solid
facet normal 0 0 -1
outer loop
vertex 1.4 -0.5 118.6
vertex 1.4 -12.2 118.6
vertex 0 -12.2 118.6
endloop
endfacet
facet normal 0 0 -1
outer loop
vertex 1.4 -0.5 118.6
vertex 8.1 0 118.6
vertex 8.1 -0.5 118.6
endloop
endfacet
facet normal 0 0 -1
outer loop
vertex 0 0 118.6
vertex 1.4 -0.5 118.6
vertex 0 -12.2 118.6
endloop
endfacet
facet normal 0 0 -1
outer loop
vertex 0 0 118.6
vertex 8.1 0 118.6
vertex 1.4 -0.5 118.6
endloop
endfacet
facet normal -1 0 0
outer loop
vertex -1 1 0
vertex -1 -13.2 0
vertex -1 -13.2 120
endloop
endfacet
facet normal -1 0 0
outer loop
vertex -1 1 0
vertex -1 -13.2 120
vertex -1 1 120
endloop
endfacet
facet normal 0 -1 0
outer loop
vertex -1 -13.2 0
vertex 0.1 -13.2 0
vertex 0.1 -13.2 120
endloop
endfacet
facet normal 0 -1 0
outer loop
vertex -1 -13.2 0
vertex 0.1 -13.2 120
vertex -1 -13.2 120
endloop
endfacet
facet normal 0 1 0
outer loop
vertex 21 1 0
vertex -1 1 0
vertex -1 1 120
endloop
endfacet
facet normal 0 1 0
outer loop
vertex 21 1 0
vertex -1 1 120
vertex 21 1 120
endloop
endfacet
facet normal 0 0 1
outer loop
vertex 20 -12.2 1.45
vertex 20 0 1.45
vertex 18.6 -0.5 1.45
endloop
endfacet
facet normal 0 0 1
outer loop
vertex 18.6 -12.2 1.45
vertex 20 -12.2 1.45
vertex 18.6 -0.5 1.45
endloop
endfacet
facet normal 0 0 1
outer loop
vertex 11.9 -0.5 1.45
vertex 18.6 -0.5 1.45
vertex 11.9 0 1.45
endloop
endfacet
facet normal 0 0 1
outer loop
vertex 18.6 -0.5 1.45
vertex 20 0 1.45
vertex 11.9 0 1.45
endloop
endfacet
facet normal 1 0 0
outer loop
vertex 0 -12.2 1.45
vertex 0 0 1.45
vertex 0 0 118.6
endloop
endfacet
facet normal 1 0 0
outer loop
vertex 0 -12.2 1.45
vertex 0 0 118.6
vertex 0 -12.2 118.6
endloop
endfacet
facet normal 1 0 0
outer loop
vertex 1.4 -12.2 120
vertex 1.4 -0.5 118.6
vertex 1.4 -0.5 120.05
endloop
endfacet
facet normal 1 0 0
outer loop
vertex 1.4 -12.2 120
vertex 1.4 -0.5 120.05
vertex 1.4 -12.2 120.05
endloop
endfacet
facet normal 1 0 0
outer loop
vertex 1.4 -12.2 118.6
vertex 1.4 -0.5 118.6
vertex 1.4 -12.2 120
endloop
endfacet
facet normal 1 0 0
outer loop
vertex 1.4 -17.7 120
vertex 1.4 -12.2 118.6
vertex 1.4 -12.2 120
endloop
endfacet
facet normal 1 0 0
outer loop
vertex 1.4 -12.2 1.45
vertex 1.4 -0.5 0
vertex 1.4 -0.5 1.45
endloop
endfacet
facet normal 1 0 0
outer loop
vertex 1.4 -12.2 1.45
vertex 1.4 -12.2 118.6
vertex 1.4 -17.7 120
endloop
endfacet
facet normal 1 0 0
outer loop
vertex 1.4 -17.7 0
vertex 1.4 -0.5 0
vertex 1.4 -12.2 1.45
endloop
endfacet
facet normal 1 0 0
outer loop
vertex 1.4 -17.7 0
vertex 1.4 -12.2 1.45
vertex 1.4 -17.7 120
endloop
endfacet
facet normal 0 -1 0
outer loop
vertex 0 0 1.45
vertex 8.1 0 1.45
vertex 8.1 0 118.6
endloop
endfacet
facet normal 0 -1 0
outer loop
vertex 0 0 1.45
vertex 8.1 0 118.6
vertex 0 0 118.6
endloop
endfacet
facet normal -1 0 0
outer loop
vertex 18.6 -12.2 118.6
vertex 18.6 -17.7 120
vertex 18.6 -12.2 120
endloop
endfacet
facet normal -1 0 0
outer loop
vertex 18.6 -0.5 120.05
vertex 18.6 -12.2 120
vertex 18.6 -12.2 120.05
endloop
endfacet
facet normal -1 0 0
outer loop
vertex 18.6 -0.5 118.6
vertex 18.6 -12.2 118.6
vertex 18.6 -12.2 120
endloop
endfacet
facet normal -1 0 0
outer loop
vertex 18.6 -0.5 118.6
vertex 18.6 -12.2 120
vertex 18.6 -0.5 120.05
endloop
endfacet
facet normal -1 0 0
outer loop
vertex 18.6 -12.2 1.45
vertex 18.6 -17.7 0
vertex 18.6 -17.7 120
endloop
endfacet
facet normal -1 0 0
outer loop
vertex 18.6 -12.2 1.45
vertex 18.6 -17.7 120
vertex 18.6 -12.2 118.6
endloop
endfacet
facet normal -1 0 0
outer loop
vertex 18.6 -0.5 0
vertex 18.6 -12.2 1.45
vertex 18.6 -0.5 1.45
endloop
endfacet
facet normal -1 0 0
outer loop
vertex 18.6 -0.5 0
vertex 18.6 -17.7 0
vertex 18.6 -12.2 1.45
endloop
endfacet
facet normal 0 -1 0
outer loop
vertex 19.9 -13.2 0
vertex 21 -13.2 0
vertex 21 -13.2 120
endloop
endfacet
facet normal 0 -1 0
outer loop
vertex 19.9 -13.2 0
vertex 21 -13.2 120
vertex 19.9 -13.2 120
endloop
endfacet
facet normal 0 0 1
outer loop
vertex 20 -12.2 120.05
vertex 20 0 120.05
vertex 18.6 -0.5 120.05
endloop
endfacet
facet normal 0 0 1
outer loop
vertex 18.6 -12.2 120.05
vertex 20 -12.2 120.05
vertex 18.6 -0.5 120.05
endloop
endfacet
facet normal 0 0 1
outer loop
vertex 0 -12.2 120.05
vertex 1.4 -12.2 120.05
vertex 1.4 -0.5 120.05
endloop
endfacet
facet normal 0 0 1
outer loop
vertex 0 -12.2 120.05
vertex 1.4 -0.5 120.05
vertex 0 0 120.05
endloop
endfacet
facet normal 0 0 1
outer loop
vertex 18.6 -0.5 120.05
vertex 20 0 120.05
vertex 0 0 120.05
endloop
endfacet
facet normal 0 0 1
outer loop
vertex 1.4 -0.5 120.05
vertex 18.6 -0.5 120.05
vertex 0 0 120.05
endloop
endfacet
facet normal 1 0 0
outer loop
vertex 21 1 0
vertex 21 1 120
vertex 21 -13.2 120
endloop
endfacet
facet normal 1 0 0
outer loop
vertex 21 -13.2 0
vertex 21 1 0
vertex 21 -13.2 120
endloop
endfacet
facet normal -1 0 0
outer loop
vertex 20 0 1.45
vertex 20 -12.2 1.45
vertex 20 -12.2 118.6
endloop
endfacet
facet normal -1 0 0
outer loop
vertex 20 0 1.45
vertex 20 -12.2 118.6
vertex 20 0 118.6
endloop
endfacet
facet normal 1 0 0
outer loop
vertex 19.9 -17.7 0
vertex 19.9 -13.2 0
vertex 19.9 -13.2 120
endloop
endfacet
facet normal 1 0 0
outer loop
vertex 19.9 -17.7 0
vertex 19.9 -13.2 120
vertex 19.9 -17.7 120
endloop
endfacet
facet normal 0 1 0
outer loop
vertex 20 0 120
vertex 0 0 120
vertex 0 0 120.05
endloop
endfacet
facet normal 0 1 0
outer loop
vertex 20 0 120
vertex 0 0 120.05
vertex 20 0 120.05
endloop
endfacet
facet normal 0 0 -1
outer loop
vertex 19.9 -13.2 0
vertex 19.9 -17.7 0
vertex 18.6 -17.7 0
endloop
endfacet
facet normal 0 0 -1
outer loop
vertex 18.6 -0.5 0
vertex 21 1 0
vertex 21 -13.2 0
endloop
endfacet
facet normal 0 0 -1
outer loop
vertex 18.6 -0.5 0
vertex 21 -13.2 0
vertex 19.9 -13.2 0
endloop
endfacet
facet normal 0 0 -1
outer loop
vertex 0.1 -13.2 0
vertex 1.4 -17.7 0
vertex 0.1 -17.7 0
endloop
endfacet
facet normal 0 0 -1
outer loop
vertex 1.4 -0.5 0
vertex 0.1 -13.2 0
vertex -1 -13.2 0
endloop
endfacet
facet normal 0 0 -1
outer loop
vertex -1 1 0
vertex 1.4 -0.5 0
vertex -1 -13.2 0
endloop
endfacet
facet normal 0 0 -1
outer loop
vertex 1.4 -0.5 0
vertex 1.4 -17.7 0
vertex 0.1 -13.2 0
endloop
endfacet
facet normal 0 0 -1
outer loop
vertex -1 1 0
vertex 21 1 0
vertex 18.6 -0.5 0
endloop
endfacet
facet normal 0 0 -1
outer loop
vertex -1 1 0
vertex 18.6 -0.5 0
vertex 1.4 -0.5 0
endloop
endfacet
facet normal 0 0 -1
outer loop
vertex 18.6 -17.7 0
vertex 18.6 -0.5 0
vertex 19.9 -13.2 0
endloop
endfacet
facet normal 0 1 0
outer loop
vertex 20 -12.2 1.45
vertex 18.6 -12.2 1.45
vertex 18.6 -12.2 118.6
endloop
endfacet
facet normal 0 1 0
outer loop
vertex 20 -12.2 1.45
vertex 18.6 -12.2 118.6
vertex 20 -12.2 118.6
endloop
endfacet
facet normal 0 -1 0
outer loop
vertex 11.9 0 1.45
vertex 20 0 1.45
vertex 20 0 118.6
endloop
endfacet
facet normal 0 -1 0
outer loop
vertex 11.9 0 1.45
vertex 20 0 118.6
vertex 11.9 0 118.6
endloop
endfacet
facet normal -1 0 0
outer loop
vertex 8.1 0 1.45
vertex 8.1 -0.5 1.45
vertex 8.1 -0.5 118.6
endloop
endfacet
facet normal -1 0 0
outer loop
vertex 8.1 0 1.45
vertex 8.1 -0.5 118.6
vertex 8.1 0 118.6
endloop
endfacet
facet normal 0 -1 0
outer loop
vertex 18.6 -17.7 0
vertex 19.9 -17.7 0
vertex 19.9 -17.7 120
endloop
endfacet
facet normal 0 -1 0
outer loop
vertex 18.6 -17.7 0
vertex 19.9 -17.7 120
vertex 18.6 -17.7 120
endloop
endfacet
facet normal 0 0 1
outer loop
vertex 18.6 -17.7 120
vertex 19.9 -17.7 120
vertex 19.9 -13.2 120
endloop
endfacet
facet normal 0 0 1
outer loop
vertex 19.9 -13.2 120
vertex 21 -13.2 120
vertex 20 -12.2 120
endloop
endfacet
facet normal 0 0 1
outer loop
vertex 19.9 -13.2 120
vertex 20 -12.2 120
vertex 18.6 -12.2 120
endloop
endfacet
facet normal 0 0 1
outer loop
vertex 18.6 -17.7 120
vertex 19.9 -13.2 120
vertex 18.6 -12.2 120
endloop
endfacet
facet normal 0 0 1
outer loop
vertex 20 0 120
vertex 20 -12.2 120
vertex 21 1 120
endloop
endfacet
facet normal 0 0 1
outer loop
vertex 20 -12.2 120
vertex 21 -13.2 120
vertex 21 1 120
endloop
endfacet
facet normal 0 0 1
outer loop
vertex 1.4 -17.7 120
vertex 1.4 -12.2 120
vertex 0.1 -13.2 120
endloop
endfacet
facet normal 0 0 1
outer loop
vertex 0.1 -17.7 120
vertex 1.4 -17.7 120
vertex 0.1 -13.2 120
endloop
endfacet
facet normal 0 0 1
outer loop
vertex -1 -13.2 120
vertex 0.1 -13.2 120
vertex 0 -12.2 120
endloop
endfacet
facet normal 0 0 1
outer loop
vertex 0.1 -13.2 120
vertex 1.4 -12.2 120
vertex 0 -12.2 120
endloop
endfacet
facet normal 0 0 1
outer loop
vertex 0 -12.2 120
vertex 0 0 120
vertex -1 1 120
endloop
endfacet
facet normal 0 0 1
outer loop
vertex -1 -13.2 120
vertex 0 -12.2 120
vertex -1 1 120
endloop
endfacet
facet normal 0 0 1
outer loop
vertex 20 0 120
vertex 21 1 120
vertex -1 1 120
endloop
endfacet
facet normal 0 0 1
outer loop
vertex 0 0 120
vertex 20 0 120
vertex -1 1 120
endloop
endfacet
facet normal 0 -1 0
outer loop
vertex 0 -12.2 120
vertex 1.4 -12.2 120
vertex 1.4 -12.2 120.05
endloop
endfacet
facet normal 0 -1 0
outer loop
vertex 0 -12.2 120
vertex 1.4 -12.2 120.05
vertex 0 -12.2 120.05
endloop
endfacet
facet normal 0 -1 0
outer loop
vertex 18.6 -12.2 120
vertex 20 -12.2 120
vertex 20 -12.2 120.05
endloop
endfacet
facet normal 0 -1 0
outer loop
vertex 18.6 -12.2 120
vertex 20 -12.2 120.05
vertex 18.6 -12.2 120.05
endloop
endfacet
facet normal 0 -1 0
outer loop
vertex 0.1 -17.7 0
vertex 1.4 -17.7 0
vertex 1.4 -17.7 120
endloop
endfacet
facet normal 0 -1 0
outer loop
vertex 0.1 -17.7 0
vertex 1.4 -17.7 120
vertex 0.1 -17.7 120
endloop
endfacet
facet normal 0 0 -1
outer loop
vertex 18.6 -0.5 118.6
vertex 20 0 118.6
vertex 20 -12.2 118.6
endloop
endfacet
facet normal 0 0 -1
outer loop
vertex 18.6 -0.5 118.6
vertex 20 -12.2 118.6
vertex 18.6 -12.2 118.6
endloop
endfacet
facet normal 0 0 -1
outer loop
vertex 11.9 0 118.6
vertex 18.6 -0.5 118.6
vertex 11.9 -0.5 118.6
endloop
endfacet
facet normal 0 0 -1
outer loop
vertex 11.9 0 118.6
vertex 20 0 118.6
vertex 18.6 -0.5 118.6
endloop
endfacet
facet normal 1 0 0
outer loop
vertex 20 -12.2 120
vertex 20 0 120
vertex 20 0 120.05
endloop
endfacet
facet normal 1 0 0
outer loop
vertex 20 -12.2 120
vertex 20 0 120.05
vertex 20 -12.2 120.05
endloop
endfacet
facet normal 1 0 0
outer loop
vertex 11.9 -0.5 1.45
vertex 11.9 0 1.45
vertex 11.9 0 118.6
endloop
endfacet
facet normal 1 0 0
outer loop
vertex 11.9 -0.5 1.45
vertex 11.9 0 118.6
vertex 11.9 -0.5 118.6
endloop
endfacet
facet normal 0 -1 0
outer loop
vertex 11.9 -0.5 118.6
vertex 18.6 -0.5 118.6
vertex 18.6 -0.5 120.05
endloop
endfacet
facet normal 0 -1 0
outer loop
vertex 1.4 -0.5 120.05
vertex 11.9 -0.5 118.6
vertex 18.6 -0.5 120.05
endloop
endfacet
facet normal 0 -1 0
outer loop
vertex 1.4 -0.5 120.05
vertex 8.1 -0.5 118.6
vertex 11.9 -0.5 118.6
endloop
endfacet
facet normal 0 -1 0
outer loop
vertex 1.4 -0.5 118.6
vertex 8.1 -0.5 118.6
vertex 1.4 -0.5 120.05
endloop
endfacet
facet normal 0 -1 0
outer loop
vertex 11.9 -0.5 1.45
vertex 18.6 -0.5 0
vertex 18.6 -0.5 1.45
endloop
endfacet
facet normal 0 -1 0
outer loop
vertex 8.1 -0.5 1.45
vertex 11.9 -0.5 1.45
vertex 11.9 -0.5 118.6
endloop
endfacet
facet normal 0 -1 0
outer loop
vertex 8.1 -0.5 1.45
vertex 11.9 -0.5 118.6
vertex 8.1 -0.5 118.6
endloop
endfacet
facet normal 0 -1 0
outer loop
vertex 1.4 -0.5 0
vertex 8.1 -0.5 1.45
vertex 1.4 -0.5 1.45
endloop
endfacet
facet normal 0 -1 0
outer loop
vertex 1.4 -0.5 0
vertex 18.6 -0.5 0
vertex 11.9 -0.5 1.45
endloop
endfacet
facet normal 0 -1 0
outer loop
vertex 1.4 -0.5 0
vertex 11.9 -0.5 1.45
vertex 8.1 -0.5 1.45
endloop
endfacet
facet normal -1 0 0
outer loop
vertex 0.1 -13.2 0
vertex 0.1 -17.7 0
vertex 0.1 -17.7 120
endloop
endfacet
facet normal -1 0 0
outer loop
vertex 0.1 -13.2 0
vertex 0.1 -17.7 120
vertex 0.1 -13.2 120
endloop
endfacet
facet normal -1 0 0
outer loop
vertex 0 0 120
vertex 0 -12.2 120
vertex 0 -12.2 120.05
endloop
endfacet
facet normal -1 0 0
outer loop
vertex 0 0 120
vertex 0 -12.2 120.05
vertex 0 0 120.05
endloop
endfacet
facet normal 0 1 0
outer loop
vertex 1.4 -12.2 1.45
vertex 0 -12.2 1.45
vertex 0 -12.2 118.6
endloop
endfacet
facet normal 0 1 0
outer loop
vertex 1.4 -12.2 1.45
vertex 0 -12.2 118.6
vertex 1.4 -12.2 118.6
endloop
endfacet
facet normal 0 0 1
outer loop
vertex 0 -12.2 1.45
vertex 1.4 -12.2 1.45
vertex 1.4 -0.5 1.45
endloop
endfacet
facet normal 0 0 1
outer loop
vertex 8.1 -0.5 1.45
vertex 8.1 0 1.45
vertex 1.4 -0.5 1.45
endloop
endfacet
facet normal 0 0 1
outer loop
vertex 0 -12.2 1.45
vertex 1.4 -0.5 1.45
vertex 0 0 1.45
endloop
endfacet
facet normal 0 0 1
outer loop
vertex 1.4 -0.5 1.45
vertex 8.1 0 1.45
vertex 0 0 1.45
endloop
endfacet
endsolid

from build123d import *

# Parameters (mm, degrees)
PAD002_DEPTH = 1.45
PAD001_DEPTH = 1.45
PAD_DEPTH    = 120


with BuildPart() as upper_slide:
    # Sketch002 → Pad002 (new body)
    with BuildSketch(Plane(origin=(1.4, -0.5, 118.6), x_dir=(1, 0, 0), z_dir=(0, 0, 1))):
        Polygon((0, -11.7), (-1.4, -11.7), (-1.4, 0.5), (18.6, 0.5), (18.6, -11.7), (17.2, -11.7), (17.2, 0), (0, 0), align=None)
    extrude(amount=PAD002_DEPTH)


with BuildPart() as lower_slide:
    # Sketch001 → Pad001 (new body)
    with BuildSketch(Plane(origin=(1.4, -0.5, 0), x_dir=(1, 0, 0), z_dir=(0, 0, 1))):
        Polygon((0, -11.7), (-1.4, -11.7), (-1.4, 0.5), (18.6, 0.5), (18.6, -11.7), (17.2, -11.7), (17.2, 0), (0, 0), align=None)
    extrude(amount=PAD001_DEPTH)


with BuildPart() as shell:
    # Sketch → Pad (new body)
    with BuildSketch(Plane.XY):
        Polygon((-1, 1), (21, 1), (21, -13.2), (19.9, -13.2), (19.9, -17.7), (18.6, -17.7), (18.6, -12.2), (20, -12.2), (20, 0), (11.9, 0), (11.9, -0.5), (8.1, -0.5), (8.1, 0), (0, 0), (0, -12.2), (1.4, -12.2), (1.4, -17.7), (0.1, -17.7), (0.1, -13.2), (-1, -13.2), align=None)
    extrude(amount=PAD_DEPTH)

    # Fusion: union upper_slide, lower_slide
    add(upper_slide.part)
    add(lower_slide.part)


solid = shell.part
